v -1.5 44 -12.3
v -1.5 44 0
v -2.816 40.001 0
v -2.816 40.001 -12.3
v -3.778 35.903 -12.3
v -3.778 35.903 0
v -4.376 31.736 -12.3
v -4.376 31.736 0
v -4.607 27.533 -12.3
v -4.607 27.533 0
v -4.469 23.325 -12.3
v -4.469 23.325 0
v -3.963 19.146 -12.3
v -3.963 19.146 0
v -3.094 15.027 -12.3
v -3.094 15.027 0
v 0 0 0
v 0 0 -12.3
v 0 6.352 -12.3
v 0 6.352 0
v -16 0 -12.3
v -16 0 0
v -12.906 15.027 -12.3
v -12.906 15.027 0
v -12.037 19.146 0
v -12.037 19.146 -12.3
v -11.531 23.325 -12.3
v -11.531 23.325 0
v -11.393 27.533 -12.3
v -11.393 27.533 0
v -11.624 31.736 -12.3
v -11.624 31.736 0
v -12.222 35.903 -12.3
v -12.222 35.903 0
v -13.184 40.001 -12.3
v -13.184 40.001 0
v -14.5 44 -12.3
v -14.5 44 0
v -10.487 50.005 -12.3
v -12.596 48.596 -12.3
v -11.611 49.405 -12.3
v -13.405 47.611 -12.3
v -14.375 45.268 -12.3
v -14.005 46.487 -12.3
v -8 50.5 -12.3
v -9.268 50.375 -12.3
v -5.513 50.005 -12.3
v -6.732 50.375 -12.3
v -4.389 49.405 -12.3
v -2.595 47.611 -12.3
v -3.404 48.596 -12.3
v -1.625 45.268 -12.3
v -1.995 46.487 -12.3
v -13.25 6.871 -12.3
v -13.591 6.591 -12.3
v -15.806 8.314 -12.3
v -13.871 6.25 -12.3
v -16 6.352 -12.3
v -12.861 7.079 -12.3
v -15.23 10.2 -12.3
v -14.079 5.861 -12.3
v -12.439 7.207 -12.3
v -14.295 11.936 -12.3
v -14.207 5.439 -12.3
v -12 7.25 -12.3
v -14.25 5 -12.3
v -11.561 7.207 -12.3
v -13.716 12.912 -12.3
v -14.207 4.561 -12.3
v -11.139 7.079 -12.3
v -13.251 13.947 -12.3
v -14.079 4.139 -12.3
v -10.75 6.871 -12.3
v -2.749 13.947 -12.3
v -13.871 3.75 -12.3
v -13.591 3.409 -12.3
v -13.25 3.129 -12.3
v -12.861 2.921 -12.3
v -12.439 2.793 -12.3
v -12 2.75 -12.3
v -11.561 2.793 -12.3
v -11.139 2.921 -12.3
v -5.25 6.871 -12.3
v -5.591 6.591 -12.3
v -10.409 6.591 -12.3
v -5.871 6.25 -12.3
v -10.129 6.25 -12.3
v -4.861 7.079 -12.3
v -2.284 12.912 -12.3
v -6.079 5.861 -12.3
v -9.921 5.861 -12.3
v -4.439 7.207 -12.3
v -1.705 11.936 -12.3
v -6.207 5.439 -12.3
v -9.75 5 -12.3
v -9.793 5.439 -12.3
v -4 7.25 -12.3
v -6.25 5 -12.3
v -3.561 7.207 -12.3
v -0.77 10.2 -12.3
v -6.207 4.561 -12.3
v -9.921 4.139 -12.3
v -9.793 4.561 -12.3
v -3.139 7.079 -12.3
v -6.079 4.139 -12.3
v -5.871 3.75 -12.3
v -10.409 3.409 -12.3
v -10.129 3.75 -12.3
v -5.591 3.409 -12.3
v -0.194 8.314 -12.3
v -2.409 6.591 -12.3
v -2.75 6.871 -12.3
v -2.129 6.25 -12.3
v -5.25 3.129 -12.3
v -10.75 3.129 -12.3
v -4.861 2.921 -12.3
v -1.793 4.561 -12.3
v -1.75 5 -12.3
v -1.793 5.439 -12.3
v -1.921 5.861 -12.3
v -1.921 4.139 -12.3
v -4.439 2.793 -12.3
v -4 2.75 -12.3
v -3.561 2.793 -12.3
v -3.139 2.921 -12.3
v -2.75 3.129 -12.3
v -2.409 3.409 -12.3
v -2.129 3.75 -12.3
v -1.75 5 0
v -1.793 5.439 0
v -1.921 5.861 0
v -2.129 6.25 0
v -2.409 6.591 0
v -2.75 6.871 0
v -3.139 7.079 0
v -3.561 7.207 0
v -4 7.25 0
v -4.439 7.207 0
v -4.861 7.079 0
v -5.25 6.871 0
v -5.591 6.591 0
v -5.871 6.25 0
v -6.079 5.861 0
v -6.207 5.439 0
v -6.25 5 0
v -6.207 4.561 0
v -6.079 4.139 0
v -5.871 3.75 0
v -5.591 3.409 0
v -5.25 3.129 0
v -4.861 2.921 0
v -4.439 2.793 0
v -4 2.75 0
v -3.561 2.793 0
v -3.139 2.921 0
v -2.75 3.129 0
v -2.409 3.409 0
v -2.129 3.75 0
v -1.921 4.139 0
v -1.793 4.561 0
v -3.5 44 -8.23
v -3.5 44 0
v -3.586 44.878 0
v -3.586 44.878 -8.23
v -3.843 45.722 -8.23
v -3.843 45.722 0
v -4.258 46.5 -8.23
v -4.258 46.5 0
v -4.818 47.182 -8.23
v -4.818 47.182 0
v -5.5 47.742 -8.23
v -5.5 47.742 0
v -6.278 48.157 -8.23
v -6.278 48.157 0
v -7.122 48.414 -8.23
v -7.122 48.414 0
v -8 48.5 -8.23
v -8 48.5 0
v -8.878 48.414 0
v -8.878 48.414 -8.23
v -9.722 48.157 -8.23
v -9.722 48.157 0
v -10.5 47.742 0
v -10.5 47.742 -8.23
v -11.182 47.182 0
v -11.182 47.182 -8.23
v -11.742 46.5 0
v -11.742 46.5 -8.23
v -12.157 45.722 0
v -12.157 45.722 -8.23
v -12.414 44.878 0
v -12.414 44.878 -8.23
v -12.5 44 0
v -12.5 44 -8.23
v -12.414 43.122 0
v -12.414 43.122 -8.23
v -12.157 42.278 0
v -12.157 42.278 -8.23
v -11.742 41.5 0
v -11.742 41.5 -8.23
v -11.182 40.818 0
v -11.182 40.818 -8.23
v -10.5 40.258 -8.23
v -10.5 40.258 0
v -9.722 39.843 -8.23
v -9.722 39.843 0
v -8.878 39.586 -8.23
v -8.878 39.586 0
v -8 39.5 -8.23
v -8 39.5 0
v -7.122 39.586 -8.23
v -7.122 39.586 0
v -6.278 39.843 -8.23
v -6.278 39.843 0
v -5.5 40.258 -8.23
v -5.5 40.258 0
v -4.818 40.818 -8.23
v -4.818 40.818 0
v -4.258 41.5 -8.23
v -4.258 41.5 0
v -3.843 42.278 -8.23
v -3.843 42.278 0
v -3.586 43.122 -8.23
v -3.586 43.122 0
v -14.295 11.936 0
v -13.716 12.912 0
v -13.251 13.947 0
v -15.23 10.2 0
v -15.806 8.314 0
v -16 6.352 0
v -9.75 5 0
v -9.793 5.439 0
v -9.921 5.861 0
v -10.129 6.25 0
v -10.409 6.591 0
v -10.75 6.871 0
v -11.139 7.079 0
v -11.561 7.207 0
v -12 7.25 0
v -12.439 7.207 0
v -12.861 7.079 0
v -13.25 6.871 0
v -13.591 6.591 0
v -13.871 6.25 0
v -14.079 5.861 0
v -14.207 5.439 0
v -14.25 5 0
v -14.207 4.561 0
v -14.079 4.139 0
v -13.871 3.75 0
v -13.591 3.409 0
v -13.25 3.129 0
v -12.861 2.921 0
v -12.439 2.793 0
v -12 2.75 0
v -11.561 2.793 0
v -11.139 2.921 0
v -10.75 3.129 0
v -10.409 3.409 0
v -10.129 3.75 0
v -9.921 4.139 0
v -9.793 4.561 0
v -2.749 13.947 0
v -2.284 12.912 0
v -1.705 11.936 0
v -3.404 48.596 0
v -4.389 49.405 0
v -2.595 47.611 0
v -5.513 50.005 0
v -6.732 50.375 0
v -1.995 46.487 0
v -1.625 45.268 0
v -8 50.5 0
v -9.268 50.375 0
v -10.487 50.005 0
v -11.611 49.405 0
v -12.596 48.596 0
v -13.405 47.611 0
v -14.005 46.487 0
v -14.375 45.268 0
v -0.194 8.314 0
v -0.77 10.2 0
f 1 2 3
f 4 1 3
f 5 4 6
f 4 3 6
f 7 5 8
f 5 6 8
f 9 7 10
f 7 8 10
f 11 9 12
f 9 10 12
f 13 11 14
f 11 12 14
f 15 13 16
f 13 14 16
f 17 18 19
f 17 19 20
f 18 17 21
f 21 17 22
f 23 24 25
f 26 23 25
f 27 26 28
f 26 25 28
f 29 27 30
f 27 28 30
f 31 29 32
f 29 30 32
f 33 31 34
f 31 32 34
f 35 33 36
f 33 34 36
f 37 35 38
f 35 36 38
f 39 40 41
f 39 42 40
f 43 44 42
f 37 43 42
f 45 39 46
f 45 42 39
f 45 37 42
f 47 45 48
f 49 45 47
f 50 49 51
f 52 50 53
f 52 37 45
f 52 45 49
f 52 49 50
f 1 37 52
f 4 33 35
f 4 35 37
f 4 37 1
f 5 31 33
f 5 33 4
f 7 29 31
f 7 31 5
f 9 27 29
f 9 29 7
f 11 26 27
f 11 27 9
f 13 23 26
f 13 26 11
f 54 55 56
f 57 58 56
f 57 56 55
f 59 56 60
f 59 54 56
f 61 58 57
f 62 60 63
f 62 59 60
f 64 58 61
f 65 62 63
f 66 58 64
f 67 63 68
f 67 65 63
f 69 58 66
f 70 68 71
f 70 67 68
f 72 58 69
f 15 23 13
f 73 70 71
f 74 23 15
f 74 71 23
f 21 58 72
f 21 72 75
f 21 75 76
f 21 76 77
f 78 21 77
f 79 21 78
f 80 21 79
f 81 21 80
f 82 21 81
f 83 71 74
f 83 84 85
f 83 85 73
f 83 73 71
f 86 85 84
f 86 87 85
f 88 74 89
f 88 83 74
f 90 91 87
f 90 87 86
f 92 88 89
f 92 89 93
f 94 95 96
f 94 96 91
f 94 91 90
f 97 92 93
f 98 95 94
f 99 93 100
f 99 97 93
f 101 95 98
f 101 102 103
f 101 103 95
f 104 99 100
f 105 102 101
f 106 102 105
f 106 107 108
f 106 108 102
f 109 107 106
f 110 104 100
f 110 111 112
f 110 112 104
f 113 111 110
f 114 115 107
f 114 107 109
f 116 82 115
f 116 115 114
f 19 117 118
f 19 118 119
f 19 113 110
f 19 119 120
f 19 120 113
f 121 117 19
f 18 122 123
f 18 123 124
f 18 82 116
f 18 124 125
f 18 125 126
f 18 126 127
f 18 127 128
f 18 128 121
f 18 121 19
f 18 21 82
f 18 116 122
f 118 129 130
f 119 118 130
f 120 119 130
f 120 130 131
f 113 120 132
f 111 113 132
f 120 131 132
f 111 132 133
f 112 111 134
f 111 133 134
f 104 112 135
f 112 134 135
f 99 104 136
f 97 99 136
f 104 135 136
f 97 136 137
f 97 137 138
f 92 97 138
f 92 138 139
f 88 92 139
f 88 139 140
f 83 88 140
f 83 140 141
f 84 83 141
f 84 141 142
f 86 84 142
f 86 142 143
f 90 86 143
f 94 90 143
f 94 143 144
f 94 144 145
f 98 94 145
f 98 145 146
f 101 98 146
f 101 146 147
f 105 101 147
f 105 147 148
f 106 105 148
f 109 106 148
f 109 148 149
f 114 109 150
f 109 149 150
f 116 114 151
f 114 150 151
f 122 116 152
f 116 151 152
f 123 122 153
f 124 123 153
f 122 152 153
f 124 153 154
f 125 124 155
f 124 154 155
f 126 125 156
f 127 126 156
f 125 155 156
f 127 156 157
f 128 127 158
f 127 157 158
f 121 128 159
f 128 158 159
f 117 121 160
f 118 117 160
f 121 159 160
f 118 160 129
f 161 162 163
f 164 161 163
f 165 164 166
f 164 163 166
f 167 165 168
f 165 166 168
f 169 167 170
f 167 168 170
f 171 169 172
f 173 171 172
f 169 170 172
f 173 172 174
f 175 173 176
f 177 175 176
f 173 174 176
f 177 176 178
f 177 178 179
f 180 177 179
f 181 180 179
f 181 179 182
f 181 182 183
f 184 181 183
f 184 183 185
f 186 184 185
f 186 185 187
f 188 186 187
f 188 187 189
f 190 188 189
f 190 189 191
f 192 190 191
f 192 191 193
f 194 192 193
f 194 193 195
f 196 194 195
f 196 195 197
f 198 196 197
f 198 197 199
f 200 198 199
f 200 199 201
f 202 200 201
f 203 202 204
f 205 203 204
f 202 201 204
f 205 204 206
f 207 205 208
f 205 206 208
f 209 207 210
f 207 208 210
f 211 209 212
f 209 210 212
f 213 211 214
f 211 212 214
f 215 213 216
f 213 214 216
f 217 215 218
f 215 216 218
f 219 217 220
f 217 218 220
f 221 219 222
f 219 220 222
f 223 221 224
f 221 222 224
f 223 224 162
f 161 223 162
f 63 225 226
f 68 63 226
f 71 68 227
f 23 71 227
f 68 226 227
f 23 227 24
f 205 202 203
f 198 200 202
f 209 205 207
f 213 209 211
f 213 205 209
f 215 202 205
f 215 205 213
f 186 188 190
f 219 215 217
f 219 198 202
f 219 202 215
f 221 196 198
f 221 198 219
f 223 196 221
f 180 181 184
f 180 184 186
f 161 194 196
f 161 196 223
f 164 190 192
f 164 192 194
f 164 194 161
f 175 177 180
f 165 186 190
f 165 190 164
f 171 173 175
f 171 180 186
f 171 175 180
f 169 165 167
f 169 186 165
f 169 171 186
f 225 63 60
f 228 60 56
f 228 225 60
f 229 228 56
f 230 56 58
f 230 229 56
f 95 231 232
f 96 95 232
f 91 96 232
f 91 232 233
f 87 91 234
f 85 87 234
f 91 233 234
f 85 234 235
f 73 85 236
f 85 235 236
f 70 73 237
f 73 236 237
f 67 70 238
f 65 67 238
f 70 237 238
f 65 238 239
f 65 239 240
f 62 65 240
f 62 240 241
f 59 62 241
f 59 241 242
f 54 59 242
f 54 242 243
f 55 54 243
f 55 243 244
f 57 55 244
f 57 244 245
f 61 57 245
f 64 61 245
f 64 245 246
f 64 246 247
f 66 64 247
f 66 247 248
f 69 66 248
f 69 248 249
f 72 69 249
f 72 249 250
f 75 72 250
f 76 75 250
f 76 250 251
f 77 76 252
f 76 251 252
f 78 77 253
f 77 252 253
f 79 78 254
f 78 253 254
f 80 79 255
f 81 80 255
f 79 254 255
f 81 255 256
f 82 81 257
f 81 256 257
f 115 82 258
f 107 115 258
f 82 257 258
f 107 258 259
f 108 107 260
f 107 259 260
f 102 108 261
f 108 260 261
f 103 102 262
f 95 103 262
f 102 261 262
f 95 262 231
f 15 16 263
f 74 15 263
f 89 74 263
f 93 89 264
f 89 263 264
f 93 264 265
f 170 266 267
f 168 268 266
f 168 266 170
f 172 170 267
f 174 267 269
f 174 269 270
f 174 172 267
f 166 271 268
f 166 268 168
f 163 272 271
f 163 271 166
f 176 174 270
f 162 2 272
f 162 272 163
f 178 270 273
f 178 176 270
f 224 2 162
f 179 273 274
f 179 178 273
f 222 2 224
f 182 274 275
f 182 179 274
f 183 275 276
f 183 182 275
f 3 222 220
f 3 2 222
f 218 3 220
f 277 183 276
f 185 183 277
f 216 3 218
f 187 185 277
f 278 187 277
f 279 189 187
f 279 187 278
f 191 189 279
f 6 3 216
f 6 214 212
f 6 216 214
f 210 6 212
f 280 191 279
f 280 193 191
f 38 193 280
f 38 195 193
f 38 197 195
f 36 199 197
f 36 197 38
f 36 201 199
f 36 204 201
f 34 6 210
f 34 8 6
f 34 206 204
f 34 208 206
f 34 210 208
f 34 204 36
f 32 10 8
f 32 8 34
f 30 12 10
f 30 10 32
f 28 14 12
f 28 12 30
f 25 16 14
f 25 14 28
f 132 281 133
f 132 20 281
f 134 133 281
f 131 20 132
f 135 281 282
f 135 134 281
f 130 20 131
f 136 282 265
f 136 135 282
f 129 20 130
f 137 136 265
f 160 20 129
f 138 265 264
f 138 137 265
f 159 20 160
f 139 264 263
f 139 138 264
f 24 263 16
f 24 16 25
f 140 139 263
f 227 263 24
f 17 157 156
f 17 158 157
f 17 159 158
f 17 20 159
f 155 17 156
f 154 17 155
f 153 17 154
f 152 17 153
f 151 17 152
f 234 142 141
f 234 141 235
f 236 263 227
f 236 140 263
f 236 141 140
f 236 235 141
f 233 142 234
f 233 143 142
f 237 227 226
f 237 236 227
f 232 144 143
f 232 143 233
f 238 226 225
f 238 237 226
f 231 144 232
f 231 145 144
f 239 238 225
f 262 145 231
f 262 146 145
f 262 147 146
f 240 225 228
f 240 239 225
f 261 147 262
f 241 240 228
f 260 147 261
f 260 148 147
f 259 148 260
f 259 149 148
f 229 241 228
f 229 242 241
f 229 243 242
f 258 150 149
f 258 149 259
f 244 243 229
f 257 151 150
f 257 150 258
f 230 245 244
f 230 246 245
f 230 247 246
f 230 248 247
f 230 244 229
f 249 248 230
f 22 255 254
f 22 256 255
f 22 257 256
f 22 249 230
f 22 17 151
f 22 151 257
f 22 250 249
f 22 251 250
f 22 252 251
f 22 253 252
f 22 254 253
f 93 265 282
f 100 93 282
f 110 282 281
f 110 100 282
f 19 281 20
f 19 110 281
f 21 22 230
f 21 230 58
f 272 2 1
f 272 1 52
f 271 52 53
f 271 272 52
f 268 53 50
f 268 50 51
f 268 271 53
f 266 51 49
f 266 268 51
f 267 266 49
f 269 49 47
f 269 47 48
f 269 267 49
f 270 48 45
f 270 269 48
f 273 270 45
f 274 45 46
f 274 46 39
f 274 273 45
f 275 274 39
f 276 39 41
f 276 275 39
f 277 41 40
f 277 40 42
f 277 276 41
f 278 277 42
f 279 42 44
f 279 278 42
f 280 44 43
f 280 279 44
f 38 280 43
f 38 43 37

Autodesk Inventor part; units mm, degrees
ref_plane "YZ Plane" through (0, 0, 0) normal (1, 0, 0) x (0, 1, 0)
ref_plane "XZ Plane" through (0, 0, 0) normal (0, 1, 0) x (-1, 0, 0)
ref_plane "XY Plane" through (0, 0, 0) normal (0, 0, 1) x (1, 0, 0)
sketch "Sketch1" plane through (0, 0, 0) normal (0, 1, 0) x (-1, 0, 0)
  line L0 (0, 0) -> (16, 0)
  line L1 (16, 0) -> (16, -12.3)
  line L2 (16, -12.3) -> (0, -12.3)
  line L3 (0, -12.3) -> (0, 0)
  dimension "d0" = 16
  dimension "d1" = 12.3
extrude "Extrusion1" add sketch "Sketch1" along normal blind 10
sketch "Sketch2" plane through (0, 10, 0) normal (0, 1, 0) x (1, 0, 0)
  line L0 (-16, 0) -> (0, 0) projected
  line L1 (-8, 0) -> (-8, 12.3)
  line L2 (0, 12.3) -> (-16, 12.3) projected
  line L3 (-14.5, 0) -> (-14.5, 12.3)
  line L4 (-1.5, 0) -> (-1.5, 12.3)
  dimension "d4" = 6.5
  dimension "d5" = 6.5
extrude "Extrusion2" add sketch "Sketch2" along normal blind 40.5
sketch "Sketch3" plane through (-16, 0, 0) normal (0, 0, 1) x (1, 0, 0)
  line L0 (14.5, 50.5) -> (1.5, 50.5) projected
  line L1 (8, 50.5) -> (8, 0)
  line L2 (0, 0) -> (16, 0) projected
  circle A0 centre (8, 44) radius 4.5
  line L3 (1.5, 50.5) -> (14.5, 50.5) projected
  circle A1 centre (8, 44) radius 6.5
  line L4 (14.5, 10) -> (14.5, 50.5) projected
  line L5 (14.5, 30.25) -> (1.5, 30.25)
  line L6 (1.5, 10) -> (1.5, 50.5) projected
  line L7 (8, 30.25) -> (11.5, 30.25)
  arc A2 (14.5, 44) -> (14.5, 10) centre (59.4062, 27) ccw
  line L8 (8, 30.25) -> (4.5, 30.25)
  arc A3 (1.5, 10) -> (1.5, 44) centre (-43.4062, 27) ccw
  dimension "d8" = 6.5
  dimension "d9" = 9
  dimension "d10" = 13
  dimension "d11" = 3.5
  dimension "d12" = 3.5
extrude "Extrusion3" cut sketch "Sketch3" against normal blind 13.5 contours L4 A1 L0 | A1 L6 L0 | L4 L5 A2 A1 | A1 A2 | A3 A1 | A1 A3 L5 L6 | L4 A2 L5 | L5 A3 L6
fillet "Fillet1" radius 10 4 edges at (0, 10, -6.15) (-1.5, 10, -6.15) (-14.5, 10, -6.15) (-16, 10, -6.15)
sketch "Sketch4" plane through (-16, 0, 0) normal (0, 0, 1) x (1, 0, 0)
  arc A0 (14.5, 44) -> (1.5, 44) centre (8, 44) ccw projected
  circle A1 centre (8, 44) radius 4.5
  point P0 (16, 0)
  dimension "d16" = 9
extrude "Extrusion4" cut sketch "Sketch4" against normal blind 8.23
sketch "Sketch5" plane through (0, 0, 0) normal (0, -1, 0) x (1, 0, 0)
  point P0 (0, 0)
sketch "Sketch7" plane through (-16, 0, 0) normal (0, 0, 1) x (1, 0, 0)
  line L0 (16, 0) -> (0, 0) projected
  line L1 (0, 0) -> (16, 0)
  line L2 (16, 0) -> (16, 10)
  line L3 (16, 10) -> (0, 10)
  line L4 (0, 10) -> (0, 0)
  line L5 (0, 5) -> (16, 5)
  line L6 (8, 10) -> (8, 0)
  circle A0 centre (4, 5) radius 1
  circle A1 centre (12, 5) radius 1
extrude "Extrusion6" cut sketch "Sketch7" against normal blind 12.3 contours A1 L5 | L5 A1 | A0 L5 | L5 A0
sketch "Sketch8" plane through (-16, 0, 0) normal (0, 0, 1) x (1, 0, 0)
  circle A0 centre (4, 5) radius 1 projected
  circle A1 centre (4, 5) radius 2.25
  circle A2 centre (12, 5) radius 1 projected
  circle A3 centre (12, 5) radius 2.25
  point P0 (16, 0)
  dimension "d24" = 4.5
  dimension "d25" = 4.5
extrude "Extrusion7" cut sketch "Sketch8" against normal blind 12.5
sketch "Sketch9" plane through (-16, 0, 0) normal (0, 0, 1) x (1, 0, 0)
  line L0 (0, 0) -> (0, 6.3517) projected
  line L1 (0, 5) -> (16, 5)
  point P0 (16, 0)
  point P1 (4, 5)
properties part number "pawn"
